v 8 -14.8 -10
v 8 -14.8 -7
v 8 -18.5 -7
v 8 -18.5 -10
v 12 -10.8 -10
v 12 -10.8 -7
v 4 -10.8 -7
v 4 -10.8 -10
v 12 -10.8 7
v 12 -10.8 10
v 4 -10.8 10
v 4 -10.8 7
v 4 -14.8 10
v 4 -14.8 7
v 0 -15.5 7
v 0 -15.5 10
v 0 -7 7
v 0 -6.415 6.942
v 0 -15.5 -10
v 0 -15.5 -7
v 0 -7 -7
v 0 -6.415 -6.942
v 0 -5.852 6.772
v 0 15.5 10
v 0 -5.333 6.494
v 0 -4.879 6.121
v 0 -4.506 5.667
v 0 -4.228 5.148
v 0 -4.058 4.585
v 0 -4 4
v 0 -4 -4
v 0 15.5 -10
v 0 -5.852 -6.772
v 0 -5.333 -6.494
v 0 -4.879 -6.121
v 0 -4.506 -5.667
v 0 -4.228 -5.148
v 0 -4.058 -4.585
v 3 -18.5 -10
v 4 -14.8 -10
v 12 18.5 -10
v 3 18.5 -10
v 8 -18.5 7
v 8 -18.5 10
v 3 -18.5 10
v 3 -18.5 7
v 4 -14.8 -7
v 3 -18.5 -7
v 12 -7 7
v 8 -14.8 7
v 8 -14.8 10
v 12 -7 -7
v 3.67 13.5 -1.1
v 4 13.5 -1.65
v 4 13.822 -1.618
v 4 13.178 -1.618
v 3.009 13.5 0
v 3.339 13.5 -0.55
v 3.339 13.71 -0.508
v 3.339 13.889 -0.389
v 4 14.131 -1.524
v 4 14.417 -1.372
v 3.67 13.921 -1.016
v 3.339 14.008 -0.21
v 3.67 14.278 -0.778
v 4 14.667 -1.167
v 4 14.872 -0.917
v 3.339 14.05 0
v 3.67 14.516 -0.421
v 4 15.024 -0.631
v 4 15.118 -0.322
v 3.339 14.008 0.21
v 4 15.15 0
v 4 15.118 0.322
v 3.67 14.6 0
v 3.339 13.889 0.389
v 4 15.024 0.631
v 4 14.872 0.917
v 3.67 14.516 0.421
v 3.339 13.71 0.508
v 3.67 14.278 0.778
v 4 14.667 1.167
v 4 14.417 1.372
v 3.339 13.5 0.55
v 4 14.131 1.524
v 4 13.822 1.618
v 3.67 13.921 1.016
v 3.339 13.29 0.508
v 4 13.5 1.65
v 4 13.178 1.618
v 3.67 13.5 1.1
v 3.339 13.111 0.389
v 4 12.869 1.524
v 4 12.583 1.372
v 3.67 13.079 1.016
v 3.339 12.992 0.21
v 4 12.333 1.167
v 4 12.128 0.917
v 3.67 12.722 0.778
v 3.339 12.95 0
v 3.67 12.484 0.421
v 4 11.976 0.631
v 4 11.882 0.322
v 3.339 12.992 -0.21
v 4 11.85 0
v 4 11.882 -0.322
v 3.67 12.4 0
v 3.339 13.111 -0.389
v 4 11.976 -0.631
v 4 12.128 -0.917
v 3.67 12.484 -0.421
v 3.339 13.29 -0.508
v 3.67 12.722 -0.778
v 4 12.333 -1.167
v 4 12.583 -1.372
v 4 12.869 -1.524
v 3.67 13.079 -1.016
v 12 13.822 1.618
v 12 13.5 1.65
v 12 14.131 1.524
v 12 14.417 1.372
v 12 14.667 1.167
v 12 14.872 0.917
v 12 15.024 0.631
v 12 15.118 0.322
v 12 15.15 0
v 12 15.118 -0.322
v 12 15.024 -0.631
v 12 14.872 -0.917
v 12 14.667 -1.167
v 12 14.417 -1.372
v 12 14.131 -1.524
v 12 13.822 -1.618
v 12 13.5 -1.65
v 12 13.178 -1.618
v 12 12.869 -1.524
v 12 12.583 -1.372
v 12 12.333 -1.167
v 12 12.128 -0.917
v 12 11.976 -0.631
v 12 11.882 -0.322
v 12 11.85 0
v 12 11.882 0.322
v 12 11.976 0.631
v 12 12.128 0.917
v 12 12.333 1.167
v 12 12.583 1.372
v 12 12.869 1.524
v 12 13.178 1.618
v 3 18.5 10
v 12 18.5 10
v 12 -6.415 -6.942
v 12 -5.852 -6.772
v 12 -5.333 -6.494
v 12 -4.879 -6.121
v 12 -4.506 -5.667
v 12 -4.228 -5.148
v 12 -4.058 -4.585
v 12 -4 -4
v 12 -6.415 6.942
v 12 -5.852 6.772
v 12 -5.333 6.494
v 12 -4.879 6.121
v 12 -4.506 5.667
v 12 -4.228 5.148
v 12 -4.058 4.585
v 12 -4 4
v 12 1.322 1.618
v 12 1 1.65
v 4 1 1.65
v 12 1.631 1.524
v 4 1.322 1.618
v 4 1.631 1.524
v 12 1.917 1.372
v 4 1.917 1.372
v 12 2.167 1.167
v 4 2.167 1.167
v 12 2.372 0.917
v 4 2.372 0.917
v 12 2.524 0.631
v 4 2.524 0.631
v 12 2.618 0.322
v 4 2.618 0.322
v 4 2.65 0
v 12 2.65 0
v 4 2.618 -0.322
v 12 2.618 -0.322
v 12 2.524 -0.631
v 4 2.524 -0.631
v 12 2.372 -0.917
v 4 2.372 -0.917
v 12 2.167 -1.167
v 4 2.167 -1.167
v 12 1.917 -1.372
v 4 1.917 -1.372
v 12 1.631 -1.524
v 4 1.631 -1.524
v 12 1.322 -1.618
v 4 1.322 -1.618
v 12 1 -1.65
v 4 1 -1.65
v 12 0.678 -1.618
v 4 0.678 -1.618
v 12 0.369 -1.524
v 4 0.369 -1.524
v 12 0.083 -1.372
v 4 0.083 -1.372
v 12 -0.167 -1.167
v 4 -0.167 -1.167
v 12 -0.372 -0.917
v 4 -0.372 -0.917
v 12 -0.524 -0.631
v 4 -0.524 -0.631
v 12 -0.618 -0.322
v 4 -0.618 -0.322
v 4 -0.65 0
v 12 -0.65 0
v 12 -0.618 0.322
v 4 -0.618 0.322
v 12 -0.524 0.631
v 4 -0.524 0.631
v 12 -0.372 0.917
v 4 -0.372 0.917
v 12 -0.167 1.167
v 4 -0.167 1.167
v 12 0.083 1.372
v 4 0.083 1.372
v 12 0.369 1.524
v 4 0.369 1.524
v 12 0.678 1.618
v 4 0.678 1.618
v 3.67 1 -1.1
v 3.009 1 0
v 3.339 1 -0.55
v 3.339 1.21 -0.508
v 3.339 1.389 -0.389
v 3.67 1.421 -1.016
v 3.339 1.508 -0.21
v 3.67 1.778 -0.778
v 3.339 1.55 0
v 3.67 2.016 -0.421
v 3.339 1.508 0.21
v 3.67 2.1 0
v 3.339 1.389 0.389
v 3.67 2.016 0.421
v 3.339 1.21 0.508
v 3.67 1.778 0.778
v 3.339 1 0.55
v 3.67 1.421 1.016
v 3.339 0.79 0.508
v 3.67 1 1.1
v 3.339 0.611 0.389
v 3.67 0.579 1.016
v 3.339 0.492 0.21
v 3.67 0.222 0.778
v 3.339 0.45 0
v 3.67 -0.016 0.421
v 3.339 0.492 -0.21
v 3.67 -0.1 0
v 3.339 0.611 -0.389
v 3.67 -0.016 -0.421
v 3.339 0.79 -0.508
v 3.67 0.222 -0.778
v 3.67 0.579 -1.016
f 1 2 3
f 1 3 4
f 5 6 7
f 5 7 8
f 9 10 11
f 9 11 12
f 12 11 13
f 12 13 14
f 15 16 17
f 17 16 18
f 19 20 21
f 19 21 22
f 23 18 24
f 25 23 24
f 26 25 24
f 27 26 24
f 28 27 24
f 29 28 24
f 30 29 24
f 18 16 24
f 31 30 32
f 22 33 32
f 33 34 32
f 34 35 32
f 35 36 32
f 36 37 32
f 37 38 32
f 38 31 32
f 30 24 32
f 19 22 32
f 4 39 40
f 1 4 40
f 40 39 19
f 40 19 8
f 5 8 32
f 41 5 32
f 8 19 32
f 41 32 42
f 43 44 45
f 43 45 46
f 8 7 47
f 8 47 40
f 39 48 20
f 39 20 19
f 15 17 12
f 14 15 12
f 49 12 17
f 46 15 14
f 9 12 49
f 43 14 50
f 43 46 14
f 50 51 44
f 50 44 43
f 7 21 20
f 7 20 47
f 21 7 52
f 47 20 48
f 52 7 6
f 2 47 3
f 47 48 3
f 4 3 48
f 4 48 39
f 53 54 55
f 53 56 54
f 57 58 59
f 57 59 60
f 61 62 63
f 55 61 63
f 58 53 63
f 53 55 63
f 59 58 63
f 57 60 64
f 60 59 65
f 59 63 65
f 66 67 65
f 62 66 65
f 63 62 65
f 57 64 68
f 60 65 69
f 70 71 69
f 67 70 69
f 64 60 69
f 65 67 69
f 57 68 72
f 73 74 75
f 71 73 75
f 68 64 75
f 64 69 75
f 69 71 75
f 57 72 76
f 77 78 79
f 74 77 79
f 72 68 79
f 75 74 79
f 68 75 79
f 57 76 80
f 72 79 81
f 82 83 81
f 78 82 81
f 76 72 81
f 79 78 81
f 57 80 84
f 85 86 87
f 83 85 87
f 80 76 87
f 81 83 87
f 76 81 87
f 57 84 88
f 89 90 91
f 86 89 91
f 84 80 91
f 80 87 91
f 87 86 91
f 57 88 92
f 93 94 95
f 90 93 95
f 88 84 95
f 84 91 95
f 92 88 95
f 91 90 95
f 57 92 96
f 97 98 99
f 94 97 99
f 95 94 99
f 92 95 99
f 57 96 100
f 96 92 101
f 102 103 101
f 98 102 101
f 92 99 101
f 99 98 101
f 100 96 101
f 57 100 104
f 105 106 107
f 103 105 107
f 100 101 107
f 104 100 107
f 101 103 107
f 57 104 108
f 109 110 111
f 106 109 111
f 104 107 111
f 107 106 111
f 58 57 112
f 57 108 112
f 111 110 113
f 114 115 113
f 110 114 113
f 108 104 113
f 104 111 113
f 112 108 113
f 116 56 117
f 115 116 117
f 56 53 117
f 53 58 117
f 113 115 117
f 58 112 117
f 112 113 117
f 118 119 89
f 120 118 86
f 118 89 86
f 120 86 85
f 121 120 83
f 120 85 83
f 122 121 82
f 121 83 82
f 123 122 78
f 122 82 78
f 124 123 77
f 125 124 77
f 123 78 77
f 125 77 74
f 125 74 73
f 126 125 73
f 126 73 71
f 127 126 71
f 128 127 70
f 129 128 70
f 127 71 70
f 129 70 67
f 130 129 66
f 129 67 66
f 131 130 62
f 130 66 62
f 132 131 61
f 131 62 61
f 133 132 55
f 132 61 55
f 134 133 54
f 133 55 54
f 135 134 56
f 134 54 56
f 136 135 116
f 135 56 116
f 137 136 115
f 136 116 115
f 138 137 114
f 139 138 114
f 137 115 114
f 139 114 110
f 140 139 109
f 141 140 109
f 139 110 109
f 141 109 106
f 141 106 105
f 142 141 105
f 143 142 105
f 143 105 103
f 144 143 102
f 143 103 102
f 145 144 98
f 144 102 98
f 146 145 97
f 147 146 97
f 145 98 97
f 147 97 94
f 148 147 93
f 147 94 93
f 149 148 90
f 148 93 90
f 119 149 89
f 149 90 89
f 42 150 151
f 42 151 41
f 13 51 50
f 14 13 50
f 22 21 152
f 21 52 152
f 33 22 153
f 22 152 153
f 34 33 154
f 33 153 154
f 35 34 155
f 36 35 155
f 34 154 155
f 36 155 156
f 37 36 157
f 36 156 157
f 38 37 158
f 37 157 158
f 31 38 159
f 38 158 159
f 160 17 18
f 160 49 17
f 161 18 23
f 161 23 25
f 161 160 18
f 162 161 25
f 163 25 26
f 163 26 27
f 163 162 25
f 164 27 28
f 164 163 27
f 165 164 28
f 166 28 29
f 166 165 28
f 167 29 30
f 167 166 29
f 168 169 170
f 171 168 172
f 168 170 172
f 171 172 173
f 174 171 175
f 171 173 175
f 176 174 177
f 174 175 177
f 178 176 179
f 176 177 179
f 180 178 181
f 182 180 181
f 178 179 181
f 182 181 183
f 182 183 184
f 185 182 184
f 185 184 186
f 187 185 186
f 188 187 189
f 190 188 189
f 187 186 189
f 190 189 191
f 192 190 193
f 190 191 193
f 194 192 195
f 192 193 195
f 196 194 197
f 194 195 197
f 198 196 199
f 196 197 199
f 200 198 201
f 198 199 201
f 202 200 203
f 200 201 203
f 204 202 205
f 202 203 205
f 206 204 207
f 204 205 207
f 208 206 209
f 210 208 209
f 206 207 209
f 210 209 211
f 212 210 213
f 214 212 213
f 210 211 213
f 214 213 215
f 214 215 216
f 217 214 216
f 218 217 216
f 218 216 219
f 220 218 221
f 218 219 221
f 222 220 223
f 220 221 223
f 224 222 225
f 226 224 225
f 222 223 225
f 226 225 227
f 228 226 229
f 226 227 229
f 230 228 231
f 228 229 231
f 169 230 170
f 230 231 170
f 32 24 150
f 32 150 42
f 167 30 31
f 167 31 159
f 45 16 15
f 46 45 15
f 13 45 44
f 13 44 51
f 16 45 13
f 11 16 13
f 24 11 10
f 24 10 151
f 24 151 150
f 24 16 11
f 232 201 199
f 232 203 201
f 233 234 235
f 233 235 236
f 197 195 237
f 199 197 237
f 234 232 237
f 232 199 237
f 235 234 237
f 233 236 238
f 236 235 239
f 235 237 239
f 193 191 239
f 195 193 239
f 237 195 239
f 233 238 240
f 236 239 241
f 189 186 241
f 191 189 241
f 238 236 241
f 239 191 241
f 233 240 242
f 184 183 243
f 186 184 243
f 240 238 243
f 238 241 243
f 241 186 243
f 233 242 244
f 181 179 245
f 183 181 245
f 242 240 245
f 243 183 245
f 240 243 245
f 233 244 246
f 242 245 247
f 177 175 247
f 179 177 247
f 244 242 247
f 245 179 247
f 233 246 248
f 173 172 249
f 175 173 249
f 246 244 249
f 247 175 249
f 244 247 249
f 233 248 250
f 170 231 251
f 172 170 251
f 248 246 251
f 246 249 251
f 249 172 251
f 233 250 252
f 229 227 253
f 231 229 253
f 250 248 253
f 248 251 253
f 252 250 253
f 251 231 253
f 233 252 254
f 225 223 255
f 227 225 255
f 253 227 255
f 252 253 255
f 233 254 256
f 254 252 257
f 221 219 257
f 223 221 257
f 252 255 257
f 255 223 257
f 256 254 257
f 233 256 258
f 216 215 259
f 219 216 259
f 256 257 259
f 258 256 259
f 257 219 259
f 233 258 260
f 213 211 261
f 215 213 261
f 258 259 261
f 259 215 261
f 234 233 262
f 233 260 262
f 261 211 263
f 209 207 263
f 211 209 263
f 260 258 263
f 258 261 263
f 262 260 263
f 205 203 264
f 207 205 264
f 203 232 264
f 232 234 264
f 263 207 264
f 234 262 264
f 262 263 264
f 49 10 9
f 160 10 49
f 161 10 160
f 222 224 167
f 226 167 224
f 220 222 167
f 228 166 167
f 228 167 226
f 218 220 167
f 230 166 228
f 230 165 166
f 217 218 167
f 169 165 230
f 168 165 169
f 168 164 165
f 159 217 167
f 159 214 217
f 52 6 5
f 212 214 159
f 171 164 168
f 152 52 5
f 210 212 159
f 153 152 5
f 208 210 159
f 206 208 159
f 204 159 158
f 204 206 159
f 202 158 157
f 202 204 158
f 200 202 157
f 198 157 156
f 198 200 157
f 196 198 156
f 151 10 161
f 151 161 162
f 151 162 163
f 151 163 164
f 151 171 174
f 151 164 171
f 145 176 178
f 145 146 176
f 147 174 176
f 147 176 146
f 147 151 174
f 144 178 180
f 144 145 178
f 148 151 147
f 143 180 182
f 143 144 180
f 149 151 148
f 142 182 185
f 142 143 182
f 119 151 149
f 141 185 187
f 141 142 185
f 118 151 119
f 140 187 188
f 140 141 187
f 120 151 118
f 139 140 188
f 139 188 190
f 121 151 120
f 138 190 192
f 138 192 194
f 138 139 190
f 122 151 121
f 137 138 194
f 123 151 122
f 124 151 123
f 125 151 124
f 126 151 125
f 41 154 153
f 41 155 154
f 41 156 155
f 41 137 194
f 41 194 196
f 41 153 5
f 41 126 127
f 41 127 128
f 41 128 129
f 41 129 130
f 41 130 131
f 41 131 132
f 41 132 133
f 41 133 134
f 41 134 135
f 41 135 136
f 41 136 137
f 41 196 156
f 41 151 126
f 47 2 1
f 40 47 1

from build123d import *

# Parameters (mm, degrees)
SKETCH1_W                      = 20
SKETCH1_H                      = 37
BOSS_EXTRUDE1_DEPTH            = 12
SKETCH2_W                      = 12
SKETCH2_H                      = 14
CUT_EXTRUDE1_DEPTH             = 14.5
CHAMFER1_SIZE                  = 3
FILLET1_R                      = 3
SKETCH3_W                      = 3
SKETCH3_H                      = 7.7
CUT_EXTRUDE2_DEPTH             = 4.000000008
SKETCH4_W                      = 3
SKETCH4_H                      = 4
CUT_EXTRUDE3_DEPTH             = 4
F_3_3_3_3_DIAMETER_HOLE1_D     = 3.3
F_3_3_3_3_DIAMETER_HOLE1_DEPTH = 8
F_3_3_3_3_DIAMETER_HOLE1_TIP   = 0.991420021


with BuildPart() as part:
    # Sketch1 → Boss-Extrude1 (new body)
    with BuildSketch(Plane(origin=(0, 0, 0), x_dir=(0, 0, -1), z_dir=(1, 0, 0))):
        Rectangle(SKETCH1_W, SKETCH1_H)
    extrude(amount=BOSS_EXTRUDE1_DEPTH)

    # Sketch2 → Cut-Extrude1 (cut)
    with BuildSketch(Plane.XZ.offset(18.5)):
        with Locations((6, 0)):
            Rectangle(SKETCH2_W, SKETCH2_H)
    extrude(amount=-CUT_EXTRUDE1_DEPTH, mode=Mode.SUBTRACT)

    # Chamfer1
    chamfer1_edges = [part.edges().sort_by_distance(p)[0] for p in [
        (0, -18.5, -8.5),
        (0, 18.5, 0),
        (0, -18.5, 8.5),
    ]]
    chamfer(chamfer1_edges, length=CHAMFER1_SIZE)

    # Fillet1
    fillet1_edges = [part.edges().sort_by_distance(p)[0] for p in [
        (6, -4, -7),
        (6, -4, 7),
    ]]
    fillet(fillet1_edges, radius=FILLET1_R)

    # Sketch3 → Cut-Extrude2 (cut)
    with BuildSketch(Plane(origin=(12, 0, 0), x_dir=(0, 0, -1), z_dir=(1, 0, 0))):
        with Locations((-8.5, -14.65)):
            Rectangle(SKETCH3_W, SKETCH3_H)
        with Locations((8.5, -14.65)):
            Rectangle(SKETCH3_W, SKETCH3_H)
    extrude(amount=-CUT_EXTRUDE2_DEPTH, mode=Mode.SUBTRACT)

    # Sketch4 → Cut-Extrude3 (cut)
    with BuildSketch(Plane(origin=(7.999999992, 0, 0), x_dir=(0, 0, -1), z_dir=(1, 0, 0))):
        with Locations((-8.5, -12.8)):
            Rectangle(SKETCH4_W, SKETCH4_H)
        with Locations((8.5, -12.8)):
            Rectangle(SKETCH4_W, SKETCH4_H)
    extrude(amount=-CUT_EXTRUDE3_DEPTH, mode=Mode.SUBTRACT)

    # Ø3.3 (3.3) Diameter Hole1
    with Locations(Plane(origin=(12, 0, 0), x_dir=(0, 0, -1), z_dir=(1, 0, 0))):
        with Locations((0, 1), (0, 13.5)):
            Hole(F_3_3_3_3_DIAMETER_HOLE1_D / 2, depth=F_3_3_3_3_DIAMETER_HOLE1_DEPTH)
            with Locations((0, 0, -(F_3_3_3_3_DIAMETER_HOLE1_DEPTH + F_3_3_3_3_DIAMETER_HOLE1_TIP / 2))):  # 118° drill point
                Cone(0, F_3_3_3_3_DIAMETER_HOLE1_D / 2, F_3_3_3_3_DIAMETER_HOLE1_TIP, mode=Mode.SUBTRACT)


solid = part.part
